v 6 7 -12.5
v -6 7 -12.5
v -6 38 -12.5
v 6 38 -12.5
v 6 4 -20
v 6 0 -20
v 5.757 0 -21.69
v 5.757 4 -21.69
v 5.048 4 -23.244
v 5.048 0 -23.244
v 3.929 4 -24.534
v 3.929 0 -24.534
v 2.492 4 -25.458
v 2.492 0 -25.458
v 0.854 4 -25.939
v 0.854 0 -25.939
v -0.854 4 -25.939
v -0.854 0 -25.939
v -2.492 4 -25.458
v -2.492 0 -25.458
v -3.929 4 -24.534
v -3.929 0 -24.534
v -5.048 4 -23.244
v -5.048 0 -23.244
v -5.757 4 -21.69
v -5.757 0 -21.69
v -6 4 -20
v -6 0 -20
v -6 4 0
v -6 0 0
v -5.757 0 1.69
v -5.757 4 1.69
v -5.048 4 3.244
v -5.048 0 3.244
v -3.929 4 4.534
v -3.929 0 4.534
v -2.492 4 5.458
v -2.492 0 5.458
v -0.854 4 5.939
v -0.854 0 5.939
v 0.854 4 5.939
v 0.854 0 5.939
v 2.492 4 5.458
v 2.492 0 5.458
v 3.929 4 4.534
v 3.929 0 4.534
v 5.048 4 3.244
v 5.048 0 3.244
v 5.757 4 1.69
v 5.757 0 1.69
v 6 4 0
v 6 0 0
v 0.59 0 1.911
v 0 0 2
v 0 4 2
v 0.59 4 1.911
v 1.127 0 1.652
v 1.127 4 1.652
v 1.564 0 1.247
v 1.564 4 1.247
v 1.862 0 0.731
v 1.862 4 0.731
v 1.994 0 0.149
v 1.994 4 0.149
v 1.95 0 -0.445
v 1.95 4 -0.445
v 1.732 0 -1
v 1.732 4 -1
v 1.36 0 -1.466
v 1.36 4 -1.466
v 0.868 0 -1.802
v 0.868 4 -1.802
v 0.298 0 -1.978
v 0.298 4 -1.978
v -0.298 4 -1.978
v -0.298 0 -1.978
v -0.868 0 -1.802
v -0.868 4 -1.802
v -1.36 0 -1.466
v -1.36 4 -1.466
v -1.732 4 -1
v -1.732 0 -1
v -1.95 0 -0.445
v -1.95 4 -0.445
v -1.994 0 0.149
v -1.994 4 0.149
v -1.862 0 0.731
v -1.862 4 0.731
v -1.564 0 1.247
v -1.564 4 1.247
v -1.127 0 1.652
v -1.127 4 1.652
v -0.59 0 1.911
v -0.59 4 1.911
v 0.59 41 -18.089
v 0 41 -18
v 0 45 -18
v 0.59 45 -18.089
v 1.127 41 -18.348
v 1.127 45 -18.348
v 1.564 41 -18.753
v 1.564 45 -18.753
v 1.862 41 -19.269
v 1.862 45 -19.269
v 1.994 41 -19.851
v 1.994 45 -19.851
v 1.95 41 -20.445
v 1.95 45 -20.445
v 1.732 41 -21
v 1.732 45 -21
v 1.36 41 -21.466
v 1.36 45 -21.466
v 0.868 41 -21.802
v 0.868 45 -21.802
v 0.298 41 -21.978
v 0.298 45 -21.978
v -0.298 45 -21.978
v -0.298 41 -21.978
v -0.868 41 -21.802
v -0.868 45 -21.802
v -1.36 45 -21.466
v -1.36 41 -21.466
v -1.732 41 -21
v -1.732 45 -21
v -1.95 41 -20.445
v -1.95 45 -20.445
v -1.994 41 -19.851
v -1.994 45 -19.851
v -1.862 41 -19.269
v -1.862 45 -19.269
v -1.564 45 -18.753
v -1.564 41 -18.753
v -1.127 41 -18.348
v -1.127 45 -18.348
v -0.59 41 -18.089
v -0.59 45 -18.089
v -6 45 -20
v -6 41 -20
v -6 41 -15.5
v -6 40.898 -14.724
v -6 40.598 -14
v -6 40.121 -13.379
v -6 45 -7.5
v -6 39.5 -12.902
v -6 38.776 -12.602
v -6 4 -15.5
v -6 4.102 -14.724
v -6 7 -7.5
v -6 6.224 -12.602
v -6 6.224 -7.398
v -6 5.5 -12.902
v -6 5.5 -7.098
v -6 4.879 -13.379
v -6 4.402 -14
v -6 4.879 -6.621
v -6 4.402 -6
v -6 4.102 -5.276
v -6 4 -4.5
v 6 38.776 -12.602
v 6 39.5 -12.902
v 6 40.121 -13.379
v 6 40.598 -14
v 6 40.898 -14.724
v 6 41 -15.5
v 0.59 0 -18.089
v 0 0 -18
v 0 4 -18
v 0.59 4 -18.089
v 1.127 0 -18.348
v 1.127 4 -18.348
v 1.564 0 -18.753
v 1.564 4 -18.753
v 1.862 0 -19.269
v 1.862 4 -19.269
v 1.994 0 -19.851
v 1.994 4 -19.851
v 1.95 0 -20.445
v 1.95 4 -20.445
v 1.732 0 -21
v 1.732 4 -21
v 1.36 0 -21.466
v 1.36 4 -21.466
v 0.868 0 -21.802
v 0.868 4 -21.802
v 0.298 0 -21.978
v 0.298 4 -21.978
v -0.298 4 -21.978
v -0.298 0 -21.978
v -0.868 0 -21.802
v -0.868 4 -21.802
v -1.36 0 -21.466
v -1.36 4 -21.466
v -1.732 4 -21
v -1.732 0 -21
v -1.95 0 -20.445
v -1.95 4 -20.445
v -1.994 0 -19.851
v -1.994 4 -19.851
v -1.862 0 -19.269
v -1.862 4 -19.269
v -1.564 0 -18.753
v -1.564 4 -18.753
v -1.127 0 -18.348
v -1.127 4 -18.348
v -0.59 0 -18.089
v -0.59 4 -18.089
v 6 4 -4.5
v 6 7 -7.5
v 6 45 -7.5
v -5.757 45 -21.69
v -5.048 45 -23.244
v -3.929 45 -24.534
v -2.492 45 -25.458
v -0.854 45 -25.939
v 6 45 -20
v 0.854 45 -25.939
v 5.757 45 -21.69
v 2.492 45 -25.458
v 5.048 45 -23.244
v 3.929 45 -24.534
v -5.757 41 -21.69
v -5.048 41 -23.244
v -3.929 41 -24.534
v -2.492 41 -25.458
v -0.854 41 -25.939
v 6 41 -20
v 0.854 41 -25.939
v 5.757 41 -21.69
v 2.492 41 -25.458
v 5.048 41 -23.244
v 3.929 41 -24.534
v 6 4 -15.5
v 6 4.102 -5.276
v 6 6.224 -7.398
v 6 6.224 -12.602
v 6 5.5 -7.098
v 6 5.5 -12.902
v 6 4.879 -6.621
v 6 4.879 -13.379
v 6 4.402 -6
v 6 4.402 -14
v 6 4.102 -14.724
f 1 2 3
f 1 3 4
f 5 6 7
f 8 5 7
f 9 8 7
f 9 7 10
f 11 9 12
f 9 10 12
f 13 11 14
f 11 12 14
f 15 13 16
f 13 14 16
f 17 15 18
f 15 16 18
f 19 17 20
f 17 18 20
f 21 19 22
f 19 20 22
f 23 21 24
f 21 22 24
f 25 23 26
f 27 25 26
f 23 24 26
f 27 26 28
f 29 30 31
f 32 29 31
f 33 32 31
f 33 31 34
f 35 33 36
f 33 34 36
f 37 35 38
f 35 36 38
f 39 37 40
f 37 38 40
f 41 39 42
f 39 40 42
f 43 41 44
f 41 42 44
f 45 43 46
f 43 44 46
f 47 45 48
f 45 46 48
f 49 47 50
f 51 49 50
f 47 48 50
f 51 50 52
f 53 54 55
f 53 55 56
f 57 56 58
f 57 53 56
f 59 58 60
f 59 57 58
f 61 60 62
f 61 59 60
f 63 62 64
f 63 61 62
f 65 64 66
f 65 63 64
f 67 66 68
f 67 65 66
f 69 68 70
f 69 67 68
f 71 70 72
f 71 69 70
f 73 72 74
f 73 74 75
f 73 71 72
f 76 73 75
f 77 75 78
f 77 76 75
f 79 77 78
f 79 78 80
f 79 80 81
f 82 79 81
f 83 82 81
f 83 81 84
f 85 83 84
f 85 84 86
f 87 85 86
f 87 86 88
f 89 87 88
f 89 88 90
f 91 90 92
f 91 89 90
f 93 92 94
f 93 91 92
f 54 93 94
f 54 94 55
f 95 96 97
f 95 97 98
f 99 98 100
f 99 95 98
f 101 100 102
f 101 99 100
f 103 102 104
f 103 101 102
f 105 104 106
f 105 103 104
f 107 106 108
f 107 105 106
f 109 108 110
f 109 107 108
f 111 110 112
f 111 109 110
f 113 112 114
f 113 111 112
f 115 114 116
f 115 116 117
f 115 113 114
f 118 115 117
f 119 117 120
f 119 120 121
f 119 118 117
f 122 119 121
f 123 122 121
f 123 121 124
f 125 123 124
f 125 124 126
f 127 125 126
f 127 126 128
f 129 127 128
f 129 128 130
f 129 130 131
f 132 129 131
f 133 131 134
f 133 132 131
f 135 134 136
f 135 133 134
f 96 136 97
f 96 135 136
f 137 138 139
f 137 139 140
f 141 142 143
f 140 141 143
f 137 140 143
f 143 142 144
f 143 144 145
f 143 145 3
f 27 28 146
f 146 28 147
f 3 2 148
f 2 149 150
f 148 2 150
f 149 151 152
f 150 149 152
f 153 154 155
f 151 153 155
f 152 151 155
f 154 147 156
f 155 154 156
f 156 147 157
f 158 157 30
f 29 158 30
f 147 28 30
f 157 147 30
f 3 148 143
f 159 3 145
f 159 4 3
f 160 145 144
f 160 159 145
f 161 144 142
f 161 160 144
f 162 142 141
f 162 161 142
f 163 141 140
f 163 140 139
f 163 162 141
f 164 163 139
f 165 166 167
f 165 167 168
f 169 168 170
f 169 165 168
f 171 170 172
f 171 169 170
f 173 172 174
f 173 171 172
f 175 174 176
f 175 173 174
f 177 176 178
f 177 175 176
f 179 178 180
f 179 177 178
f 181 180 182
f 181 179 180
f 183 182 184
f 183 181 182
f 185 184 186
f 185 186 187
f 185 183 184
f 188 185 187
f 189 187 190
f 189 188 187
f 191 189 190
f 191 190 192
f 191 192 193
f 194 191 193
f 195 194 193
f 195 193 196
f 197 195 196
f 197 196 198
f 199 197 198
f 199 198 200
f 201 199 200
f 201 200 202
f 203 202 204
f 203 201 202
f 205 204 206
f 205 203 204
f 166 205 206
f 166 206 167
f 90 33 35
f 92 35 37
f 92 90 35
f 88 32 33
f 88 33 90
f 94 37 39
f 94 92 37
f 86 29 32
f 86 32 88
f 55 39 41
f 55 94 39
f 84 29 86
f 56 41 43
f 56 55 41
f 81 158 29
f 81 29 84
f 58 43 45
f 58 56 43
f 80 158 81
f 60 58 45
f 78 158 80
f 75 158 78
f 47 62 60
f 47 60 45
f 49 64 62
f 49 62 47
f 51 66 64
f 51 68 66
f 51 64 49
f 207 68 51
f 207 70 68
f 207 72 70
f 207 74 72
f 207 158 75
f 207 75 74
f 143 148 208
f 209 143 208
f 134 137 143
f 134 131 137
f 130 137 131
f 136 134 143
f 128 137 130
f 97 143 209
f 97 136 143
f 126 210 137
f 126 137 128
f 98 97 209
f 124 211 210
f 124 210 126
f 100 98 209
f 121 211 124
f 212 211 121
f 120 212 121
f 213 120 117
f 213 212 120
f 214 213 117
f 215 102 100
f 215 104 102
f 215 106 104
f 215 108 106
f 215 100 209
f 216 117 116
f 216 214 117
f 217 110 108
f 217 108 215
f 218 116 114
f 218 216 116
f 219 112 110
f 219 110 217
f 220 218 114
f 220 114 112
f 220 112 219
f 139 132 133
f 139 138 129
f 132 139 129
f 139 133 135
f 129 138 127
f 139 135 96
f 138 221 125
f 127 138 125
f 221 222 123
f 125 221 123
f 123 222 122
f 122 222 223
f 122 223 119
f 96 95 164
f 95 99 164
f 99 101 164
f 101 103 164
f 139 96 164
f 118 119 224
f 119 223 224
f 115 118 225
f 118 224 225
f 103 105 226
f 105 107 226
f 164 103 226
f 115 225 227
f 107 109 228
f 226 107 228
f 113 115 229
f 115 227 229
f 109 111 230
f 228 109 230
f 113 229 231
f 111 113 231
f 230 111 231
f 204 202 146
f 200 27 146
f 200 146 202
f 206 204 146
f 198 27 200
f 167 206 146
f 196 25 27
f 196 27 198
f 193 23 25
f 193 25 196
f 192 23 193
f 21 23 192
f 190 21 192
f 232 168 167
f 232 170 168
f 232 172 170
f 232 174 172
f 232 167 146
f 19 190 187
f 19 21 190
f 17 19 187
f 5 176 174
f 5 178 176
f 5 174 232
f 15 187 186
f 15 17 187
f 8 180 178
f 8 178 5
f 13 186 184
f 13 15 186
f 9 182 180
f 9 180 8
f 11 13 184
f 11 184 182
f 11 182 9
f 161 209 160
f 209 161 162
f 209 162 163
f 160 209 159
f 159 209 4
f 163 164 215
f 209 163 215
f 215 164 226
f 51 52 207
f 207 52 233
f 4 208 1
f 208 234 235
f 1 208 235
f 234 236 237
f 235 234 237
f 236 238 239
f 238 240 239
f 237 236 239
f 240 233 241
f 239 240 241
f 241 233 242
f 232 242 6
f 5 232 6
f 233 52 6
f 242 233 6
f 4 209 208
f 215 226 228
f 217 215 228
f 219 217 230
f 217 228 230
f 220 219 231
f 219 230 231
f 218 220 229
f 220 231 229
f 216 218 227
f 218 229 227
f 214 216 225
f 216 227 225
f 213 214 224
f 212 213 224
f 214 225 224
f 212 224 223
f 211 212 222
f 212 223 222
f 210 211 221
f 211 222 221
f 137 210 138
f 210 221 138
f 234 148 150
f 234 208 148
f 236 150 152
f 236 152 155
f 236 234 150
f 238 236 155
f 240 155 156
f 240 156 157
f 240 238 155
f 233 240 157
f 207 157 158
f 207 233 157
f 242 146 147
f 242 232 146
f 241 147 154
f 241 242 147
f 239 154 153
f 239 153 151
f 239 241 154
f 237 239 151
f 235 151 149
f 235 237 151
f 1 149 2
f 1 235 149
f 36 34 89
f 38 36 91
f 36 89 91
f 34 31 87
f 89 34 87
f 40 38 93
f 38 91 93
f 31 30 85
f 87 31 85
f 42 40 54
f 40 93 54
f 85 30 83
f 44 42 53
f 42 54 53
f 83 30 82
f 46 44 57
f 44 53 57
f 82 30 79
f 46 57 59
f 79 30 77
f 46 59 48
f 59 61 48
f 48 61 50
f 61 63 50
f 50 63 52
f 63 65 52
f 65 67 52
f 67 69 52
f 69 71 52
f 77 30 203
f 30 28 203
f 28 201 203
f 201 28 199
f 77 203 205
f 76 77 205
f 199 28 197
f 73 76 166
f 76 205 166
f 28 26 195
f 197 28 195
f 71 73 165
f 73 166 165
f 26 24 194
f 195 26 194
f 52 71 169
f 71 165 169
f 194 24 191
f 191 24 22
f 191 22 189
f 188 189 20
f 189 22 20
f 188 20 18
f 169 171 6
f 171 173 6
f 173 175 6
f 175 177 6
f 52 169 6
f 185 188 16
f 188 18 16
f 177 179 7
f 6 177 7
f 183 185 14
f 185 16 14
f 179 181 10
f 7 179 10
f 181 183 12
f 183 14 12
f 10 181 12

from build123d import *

# Parameters (mm, degrees)
SKETCH1_R           = 2
BOSS_EXTRUDE1_DEPTH = 4
SKETCH2_W           = 12
SKETCH2_H           = 5
BOSS_EXTRUDE2_DEPTH = 37
SKETCH3_R           = 2
SKETCH3_W           = 12
SKETCH3_H           = 5
BOSS_EXTRUDE3_DEPTH = 4
FILLET1_R           = 3


with BuildPart() as part:
    # Sketch1 → Boss-Extrude1 (new body)
    with BuildSketch(Plane(origin=(0, 0, 0), x_dir=(1, 0, 0), z_dir=(0, 1, 0))):
        with BuildLine():
            ThreePointArc((6, 20), (0, 26), (-6, 20))
            Line((-6, 20), (-6, 0))
            ThreePointArc((-6, 0), (0, -6), (6, 0))
            Line((6, 0), (6, 20))
        make_face()
        with Locations(Location((0, 20, 0), (0, 0, 270))):
            Circle(SKETCH1_R, mode=Mode.SUBTRACT)
        with Locations(Location((0, 0, 0), (0, 0, 270))):
            Circle(SKETCH1_R, mode=Mode.SUBTRACT)
    extrude(amount=BOSS_EXTRUDE1_DEPTH)

    # Sketch2 → Boss-Extrude2 (add)
    with BuildSketch(Plane(origin=(0, 4, 0), x_dir=(1, 0, 0), z_dir=(0, 1, 0))):
        with Locations((0, 10)):
            Rectangle(SKETCH2_W, SKETCH2_H)
    extrude(amount=BOSS_EXTRUDE2_DEPTH)

    # Sketch3 → Boss-Extrude3 (add)
    # profile 1 of 2: a face of its own
    with BuildSketch(Plane(origin=(0, 41, 0), x_dir=(1, 0, 0), z_dir=(0, 1, 0))):
        with BuildLine():
            Line((6, 12.5), (6, 20))
            ThreePointArc((6, 20), (0, 26), (-6, 20))
            Line((-6, 20), (-6, 12.5))
            Line((-6, 12.5), (6, 12.5))
        make_face()
        with Locations(Location((0, 20, 0), (0, 0, 270))):
            Circle(SKETCH3_R, mode=Mode.SUBTRACT)
    # profile 2 of 2: a face of its own
    with BuildSketch(Plane(origin=(0, 41, 0), x_dir=(1, 0, 0), z_dir=(0, 1, 0))):
        with Locations((0, 10)):
            Rectangle(SKETCH3_W, SKETCH3_H)
    extrude(amount=BOSS_EXTRUDE3_DEPTH)

    # Fillet1
    fillet1_edges = [part.edges().sort_by_distance(p)[0] for p in [
        (0, 4, -12.5),
        (0, 41, -12.5),
        (0, 4, -7.5),
    ]]
    fillet(fillet1_edges, radius=FILLET1_R)


solid = part.part
